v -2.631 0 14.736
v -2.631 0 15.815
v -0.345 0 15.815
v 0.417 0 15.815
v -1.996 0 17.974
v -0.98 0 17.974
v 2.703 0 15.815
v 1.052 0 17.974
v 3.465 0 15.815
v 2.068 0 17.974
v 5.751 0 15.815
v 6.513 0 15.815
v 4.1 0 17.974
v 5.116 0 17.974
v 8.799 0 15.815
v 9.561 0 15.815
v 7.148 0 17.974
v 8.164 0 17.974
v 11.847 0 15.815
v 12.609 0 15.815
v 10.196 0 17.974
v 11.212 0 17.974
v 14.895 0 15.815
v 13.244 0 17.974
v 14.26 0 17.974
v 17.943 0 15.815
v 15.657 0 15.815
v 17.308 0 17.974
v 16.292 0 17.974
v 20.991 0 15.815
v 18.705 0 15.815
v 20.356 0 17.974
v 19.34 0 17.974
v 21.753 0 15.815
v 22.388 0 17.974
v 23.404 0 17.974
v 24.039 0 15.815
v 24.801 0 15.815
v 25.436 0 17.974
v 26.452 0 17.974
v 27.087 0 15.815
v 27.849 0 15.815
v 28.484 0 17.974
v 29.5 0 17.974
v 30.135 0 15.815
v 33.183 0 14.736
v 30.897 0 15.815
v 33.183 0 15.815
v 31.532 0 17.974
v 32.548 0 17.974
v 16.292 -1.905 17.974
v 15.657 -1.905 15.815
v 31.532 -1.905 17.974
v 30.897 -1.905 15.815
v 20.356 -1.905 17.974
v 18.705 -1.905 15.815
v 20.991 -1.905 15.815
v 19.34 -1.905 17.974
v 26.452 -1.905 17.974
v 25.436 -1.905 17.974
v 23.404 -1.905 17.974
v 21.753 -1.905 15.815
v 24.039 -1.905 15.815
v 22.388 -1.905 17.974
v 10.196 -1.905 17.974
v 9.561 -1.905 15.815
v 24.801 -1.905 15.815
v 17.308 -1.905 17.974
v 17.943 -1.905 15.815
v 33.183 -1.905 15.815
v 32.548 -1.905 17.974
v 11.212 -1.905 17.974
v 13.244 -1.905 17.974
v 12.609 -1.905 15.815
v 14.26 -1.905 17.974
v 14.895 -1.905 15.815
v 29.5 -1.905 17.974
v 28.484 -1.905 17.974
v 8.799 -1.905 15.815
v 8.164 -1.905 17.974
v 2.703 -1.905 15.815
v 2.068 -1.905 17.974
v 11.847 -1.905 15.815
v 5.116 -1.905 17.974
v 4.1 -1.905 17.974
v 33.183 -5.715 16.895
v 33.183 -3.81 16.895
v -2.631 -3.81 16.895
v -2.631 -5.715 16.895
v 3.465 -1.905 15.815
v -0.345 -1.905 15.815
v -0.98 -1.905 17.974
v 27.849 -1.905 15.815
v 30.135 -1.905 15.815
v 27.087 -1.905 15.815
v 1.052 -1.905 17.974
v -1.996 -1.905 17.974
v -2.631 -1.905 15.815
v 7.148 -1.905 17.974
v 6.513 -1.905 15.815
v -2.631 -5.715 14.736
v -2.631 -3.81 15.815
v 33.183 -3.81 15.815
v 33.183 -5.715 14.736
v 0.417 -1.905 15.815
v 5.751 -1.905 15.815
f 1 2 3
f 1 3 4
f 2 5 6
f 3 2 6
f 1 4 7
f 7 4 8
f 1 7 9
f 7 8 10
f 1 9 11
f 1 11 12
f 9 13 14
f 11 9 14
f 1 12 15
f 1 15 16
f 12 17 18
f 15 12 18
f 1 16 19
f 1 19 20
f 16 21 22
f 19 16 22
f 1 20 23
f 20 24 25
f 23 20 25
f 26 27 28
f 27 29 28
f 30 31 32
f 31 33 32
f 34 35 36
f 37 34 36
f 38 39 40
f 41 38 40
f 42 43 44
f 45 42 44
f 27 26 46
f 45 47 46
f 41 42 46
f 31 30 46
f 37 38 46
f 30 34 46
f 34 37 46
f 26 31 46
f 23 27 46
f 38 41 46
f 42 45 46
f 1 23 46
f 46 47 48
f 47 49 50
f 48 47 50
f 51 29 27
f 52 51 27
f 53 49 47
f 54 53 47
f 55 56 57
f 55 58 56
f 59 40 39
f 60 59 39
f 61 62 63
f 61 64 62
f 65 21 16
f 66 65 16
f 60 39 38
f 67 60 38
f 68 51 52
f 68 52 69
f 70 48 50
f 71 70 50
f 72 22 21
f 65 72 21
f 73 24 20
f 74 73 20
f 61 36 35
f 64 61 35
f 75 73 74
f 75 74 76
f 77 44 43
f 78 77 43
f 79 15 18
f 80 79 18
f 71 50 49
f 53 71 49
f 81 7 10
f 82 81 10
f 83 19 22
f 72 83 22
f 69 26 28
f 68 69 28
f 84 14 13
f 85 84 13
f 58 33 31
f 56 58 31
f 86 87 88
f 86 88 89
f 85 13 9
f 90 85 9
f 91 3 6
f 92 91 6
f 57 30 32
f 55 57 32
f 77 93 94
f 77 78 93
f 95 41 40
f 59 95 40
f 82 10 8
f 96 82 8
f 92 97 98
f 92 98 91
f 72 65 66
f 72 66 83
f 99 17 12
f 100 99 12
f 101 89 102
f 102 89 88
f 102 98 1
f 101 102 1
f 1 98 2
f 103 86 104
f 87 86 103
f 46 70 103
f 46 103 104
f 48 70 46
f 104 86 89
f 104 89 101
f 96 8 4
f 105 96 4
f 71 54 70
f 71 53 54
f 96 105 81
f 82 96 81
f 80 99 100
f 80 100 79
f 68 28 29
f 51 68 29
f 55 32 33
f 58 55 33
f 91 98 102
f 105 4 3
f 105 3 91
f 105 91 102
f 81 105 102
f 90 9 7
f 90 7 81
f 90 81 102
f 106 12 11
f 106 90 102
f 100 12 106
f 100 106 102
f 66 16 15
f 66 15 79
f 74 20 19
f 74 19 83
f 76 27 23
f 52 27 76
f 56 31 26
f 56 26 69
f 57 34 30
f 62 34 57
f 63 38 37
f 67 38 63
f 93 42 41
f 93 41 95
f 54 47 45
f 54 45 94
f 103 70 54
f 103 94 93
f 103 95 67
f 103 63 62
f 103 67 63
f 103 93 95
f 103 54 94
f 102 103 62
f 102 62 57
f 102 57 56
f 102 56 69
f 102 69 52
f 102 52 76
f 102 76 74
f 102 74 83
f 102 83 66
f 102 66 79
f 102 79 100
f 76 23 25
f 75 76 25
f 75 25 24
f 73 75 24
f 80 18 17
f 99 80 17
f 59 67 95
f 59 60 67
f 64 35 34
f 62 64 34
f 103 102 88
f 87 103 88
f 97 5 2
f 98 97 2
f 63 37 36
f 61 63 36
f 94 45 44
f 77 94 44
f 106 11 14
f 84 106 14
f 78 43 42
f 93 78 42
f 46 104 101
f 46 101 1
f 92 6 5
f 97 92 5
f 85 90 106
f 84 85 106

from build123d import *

# Parameters (mm, degrees)
F1_DEPTH = 3.81
F4_DEPTH = 71.628
F5_SCALE = 0.5


with BuildPart() as f1:
    # F0 (on Front) → F1 (new body)
    with BuildSketch(Plane.XZ):
        Polygon((-38.4448663006, 16.8945933835), (-38.4448663006, 14.7355933835), (33.1831336994, 14.7355933835), (33.1831336994, 16.8945933835), (28.6111336994, 16.8945933835), (27.0871336994, 16.8945933835), (22.5151336994, 16.8945933835), (20.9911336994, 16.8945933835), (16.4191336994, 16.8945933835), (14.8951336994, 16.8945933835), (10.3231336994, 16.8945933835), (8.7991336994, 16.8945933835), (4.2271336994, 16.8945933835), (2.7031336994, 16.8945933835), (-1.8688663006, 16.8945933835), (-3.3928663006, 16.8945933835), (-7.9648663006, 16.8945933835), (-9.4888663006, 16.8945933835), (-14.0608663006, 16.8945933835), (-15.5848663006, 16.8945933835), (-20.1568663006, 16.8945933835), (-21.6808663006, 16.8945933835), (-26.2528663006, 16.8945933835), (-27.7768663006, 16.8945933835), (-32.3488663006, 16.8945933835), (-33.8728663006, 16.8945933835), align=None)
        Polygon((-37.1748663006, 21.2125933835), (-38.4448663006, 16.8945933835), (-33.8728663006, 16.8945933835), (-35.1428663006, 21.2125933835), align=None)
        Polygon((28.6111336994, 16.8945933835), (33.1831336994, 16.8945933835), (31.9131336994, 21.2125933835), (29.8811336994, 21.2125933835), align=None)
        Polygon((-31.0788663006, 21.2125933835), (-32.3488663006, 16.8945933835), (-27.7768663006, 16.8945933835), (-29.0468663006, 21.2125933835), align=None)
        Polygon((22.5151336994, 16.8945933835), (27.0871336994, 16.8945933835), (25.8171336994, 21.2125933835), (23.7851336994, 21.2125933835), align=None)
        Polygon((-24.9828663006, 21.2125933835), (-26.2528663006, 16.8945933835), (-21.6808663006, 16.8945933835), (-22.9508663006, 21.2125933835), align=None)
        Polygon((16.4191336994, 16.8945933835), (20.9911336994, 16.8945933835), (19.7211336994, 21.2125933835), (17.6891336994, 21.2125933835), align=None)
        Polygon((-18.8868663006, 21.2125933835), (-20.1568663006, 16.8945933835), (-15.5848663006, 16.8945933835), (-16.8548663006, 21.2125933835), align=None)
        Polygon((10.3231336994, 16.8945933835), (14.8951336994, 16.8945933835), (13.6251336994, 21.2125933835), (11.5931336994, 21.2125933835), align=None)
        Polygon((-12.7908663006, 21.2125933835), (-14.0608663006, 16.8945933835), (-9.4888663006, 16.8945933835), (-10.7588663006, 21.2125933835), align=None)
        Polygon((4.2271336994, 16.8945933835), (8.7991336994, 16.8945933835), (7.5291336994, 21.2125933835), (5.4971336994, 21.2125933835), align=None)
        Polygon((-6.6948663006, 21.2125933835), (-7.9648663006, 16.8945933835), (-3.3928663006, 16.8945933835), (-4.6628663006, 21.2125933835), align=None)
        Polygon((-1.8688663006, 16.8945933835), (2.7031336994, 16.8945933835), (1.4331336994, 21.2125933835), (-0.5988663006, 21.2125933835), align=None)
    extrude(amount=F1_DEPTH)

    # F3 (on plane+point) → F4 (join, through all)
    with BuildSketch(Plane.YZ.offset(33.1831336994)):
        Polygon((-11.43, 14.7355933835), (-3.81, 14.7355933835), (-3.81, 16.8945933835), (-7.62, 16.8945933835), (-7.62, 19.0535933835), (-11.43, 19.0535933835), (-11.43, 16.8945933835), align=None)
    extrude(amount=-F4_DEPTH)


with BuildPart() as f1_1:
    # F5: moved
    add(f1.part.scale(F5_SCALE).moved(Location((16.5915668497, 0, 7.3677966917))))


solid = f1_1.part
